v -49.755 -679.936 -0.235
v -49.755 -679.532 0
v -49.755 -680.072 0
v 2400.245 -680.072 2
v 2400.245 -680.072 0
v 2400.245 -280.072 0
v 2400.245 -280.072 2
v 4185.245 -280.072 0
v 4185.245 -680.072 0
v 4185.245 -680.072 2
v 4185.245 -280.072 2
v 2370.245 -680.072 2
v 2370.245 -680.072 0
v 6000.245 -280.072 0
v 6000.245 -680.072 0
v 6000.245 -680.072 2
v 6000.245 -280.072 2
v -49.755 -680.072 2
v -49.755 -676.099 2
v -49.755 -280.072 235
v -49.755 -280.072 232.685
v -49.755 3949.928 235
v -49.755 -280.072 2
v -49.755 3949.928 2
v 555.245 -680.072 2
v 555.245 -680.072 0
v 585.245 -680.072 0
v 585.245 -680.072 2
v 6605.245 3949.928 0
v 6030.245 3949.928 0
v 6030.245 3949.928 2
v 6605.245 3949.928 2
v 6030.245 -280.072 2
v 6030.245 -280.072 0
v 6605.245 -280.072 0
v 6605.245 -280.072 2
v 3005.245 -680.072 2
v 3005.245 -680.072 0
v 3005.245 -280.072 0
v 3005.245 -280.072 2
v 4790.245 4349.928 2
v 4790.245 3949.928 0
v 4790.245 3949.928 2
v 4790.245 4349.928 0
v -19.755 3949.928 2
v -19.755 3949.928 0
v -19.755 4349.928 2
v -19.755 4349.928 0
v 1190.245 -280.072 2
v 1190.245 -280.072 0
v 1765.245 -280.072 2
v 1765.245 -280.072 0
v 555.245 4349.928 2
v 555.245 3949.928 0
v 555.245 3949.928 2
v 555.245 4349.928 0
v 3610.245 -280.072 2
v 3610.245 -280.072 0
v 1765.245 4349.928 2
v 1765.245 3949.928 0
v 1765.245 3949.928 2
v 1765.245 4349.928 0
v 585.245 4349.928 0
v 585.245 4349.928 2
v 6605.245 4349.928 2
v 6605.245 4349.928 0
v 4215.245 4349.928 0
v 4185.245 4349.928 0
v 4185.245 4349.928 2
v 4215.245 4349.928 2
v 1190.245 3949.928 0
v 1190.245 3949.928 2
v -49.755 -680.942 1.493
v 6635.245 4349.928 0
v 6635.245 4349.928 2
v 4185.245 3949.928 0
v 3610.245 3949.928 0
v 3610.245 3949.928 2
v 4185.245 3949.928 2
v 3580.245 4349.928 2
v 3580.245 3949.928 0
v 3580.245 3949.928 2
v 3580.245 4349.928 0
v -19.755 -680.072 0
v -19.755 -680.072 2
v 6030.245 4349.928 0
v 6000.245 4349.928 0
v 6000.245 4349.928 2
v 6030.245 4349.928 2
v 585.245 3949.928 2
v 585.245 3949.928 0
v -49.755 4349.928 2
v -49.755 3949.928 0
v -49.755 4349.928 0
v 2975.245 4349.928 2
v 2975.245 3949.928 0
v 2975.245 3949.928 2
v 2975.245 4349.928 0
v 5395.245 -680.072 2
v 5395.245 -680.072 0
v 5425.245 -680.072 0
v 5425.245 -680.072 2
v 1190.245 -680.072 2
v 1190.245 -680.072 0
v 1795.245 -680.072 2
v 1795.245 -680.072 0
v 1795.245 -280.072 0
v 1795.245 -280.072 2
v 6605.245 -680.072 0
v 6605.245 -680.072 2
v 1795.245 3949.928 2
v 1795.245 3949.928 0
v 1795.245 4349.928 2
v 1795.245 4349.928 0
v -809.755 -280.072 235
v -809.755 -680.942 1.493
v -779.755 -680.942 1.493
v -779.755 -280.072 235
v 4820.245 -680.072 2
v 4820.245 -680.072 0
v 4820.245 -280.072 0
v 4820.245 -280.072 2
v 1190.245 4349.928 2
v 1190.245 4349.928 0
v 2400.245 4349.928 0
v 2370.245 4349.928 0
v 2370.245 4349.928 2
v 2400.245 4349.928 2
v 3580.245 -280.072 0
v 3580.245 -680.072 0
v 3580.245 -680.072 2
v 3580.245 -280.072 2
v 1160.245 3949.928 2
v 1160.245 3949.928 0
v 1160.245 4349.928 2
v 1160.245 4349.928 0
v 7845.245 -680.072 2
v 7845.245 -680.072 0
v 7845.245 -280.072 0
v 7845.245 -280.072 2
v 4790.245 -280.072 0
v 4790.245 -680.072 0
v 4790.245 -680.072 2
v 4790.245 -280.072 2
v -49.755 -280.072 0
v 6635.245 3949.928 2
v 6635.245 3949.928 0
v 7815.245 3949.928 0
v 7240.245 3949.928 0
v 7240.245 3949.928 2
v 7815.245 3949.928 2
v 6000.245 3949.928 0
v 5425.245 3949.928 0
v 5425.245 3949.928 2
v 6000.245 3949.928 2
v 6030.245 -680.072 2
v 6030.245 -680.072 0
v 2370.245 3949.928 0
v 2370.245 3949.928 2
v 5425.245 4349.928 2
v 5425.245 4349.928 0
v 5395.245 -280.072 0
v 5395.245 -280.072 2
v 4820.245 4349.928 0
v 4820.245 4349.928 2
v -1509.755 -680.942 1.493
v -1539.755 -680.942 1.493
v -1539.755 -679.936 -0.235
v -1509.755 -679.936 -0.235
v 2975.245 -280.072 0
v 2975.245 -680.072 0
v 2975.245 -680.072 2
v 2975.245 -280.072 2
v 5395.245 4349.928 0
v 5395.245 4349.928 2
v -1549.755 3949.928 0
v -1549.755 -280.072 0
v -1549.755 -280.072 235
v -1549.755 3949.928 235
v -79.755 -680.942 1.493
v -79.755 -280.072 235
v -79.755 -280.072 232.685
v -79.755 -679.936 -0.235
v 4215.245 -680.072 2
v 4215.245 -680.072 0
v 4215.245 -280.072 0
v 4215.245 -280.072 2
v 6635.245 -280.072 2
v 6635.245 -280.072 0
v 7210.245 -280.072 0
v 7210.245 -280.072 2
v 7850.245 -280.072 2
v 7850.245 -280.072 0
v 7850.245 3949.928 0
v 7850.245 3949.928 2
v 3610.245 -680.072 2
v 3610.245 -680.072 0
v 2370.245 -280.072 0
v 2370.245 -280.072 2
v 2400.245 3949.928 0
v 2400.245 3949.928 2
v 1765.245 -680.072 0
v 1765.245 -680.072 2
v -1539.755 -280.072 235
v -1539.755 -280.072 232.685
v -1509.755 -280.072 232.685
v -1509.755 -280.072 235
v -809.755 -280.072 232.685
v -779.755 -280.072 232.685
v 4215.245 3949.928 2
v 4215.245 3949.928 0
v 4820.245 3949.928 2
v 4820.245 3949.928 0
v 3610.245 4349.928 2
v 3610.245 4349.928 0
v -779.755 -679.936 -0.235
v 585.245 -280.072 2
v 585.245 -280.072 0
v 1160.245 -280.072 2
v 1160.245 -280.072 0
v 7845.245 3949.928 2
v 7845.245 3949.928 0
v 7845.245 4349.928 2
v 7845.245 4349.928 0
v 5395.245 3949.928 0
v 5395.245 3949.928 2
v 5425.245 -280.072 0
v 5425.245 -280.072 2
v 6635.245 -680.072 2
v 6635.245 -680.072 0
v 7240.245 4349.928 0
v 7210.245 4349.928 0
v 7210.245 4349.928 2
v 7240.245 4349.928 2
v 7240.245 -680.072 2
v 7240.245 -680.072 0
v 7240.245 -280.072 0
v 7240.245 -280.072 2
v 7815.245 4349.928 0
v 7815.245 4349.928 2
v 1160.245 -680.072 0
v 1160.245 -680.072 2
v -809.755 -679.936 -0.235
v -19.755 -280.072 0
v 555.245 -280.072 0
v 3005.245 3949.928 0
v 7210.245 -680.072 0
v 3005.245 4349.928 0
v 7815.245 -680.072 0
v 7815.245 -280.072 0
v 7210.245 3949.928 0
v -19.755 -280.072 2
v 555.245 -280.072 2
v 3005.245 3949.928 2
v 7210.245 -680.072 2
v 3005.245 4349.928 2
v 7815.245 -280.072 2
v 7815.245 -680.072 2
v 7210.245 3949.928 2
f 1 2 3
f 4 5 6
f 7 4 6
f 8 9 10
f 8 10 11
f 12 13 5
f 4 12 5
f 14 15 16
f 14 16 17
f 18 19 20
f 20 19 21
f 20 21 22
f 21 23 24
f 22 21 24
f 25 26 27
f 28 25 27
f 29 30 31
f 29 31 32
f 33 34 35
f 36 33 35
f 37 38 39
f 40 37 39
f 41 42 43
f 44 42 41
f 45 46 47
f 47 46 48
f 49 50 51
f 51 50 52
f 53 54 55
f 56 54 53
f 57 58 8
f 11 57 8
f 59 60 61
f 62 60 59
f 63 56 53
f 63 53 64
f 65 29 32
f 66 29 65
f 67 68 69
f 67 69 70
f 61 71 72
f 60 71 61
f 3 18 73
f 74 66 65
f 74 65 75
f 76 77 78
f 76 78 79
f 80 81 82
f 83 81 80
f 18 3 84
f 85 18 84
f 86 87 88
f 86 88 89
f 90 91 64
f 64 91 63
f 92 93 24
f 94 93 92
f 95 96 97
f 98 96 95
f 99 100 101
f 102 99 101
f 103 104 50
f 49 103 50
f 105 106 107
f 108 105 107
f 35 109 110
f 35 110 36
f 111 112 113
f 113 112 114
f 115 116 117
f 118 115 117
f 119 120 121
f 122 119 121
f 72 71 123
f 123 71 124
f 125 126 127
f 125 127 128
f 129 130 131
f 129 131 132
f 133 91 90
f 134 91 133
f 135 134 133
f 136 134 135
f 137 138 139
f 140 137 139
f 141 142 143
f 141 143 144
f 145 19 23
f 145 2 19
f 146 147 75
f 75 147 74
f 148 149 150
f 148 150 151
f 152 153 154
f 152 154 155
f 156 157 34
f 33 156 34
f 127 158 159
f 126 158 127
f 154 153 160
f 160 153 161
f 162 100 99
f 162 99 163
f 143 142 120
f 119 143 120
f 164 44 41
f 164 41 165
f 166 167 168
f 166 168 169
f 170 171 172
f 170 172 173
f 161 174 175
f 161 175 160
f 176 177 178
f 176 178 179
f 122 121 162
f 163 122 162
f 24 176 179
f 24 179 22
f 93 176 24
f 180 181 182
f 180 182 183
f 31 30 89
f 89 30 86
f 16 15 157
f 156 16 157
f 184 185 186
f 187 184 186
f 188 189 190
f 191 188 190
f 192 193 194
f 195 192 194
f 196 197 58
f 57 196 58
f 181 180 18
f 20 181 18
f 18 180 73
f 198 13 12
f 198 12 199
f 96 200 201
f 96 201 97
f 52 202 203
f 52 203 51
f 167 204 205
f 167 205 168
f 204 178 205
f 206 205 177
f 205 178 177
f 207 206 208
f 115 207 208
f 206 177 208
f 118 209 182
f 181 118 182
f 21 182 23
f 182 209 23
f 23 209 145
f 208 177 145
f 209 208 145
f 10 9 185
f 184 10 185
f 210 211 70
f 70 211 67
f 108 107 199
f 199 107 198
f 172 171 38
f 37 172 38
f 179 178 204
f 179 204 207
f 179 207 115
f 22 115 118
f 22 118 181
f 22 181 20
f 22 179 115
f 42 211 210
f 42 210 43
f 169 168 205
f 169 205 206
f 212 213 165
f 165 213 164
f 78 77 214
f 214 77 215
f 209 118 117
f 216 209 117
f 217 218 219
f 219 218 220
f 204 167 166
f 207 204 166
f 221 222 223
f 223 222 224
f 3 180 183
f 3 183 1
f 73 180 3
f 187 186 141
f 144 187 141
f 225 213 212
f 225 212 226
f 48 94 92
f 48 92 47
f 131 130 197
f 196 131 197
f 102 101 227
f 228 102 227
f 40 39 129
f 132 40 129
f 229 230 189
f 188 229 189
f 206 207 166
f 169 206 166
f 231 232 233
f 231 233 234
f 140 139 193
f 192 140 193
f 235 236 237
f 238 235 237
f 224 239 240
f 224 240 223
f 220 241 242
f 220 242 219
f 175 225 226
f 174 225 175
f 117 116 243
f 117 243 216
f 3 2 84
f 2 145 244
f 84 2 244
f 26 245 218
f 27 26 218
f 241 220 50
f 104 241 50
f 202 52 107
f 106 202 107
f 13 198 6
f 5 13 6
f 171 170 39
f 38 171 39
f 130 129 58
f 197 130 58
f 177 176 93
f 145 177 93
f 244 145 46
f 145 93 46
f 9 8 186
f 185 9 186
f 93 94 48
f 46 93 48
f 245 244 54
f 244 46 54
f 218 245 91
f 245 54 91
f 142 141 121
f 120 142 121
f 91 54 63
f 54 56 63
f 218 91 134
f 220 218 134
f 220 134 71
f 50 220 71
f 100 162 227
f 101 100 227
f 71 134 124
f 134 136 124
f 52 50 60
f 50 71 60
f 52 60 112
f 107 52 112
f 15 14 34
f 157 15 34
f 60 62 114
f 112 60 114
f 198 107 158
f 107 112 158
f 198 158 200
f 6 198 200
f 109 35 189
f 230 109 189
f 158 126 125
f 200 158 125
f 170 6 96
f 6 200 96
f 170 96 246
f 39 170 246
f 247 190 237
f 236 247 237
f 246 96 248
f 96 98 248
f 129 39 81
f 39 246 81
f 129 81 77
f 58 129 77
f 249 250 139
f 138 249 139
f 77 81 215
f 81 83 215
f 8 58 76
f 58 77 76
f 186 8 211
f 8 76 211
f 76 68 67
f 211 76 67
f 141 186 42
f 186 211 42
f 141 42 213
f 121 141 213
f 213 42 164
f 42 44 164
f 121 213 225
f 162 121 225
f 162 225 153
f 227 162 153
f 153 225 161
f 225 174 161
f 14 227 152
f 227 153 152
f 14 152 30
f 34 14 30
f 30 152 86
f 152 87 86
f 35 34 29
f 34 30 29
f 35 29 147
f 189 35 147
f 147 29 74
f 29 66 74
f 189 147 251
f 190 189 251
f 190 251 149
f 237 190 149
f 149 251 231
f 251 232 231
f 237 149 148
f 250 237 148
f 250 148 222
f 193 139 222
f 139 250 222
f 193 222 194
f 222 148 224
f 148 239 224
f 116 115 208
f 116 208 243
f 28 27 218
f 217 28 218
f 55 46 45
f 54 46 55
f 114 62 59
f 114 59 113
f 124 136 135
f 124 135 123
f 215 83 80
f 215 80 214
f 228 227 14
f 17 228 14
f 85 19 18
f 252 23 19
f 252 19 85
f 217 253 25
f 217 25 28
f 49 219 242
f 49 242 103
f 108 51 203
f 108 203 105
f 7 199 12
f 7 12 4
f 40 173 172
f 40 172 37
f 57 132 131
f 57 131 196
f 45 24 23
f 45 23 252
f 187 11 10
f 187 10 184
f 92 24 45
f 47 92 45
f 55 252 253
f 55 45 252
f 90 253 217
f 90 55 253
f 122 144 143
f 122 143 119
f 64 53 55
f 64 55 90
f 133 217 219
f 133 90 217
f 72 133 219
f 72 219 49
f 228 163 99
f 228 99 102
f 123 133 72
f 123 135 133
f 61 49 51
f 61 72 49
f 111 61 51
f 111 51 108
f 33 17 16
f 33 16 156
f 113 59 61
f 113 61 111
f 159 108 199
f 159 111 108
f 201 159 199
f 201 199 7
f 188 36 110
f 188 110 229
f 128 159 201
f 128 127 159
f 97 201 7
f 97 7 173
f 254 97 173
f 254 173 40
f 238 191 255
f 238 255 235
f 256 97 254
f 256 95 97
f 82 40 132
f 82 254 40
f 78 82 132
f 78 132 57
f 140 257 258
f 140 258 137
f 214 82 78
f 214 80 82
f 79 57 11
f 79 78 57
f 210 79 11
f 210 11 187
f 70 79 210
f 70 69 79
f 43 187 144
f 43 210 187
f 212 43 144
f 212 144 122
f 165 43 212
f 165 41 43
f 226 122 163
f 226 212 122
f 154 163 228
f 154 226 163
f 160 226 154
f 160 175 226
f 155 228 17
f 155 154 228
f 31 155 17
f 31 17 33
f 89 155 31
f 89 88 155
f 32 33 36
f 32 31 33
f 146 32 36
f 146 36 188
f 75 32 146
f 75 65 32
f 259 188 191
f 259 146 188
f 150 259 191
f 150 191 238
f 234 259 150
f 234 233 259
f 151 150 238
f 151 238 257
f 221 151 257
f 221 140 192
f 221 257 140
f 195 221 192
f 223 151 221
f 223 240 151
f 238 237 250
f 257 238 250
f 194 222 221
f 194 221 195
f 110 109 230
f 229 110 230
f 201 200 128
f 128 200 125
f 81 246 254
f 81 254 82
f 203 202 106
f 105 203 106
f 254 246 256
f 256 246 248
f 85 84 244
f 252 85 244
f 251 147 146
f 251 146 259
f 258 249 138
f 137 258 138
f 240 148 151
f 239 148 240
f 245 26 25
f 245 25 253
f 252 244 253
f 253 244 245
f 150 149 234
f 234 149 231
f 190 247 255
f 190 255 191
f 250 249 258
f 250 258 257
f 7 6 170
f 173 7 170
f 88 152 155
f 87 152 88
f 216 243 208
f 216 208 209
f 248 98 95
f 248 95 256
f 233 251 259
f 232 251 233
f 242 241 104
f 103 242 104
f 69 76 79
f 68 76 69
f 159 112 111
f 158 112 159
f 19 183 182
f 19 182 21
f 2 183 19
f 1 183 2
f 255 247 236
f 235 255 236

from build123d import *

# Parameters (mm, degrees)
F0_W     = 1500
F0_H     = 4230
F1_DEPTH = 235
F2_W     = 7900
F2_H     = 4230
F3_DEPTH = 2
F4_W     = 30
F4_H     = 400
F5_DEPTH = 2
F7_W     = 30
F7_H     = 463.9202661871
F8_DEPTH = 2


with BuildPart() as f1:
    # F0 (on Top) → F1 (new body)
    with BuildSketch(Plane.XY):
        with Locations((-799.7552353144, 1834.9275854864)):
            Rectangle(F0_W, F0_H)
    extrude(amount=F1_DEPTH)

    # F2 (on Top) → F3 (join)
    with BuildSketch(Plane.XY):
        with Locations((3900.2447646856, 1834.9275854864)):
            Rectangle(F2_W, F2_H)
    extrude(amount=F3_DEPTH)

    # F4 (on Top) → F5 (join)
    with BuildSketch(Plane.XY):
        with Locations((-34.7552353144, 4149.9275854864)):
            Rectangle(F4_W, F4_H)
        with Locations((570.2447646856, 4149.9275854864)):
            Rectangle(F4_W, F4_H)
        with Locations((1175.2447646856, 4149.9275854864)):
            Rectangle(F4_W, F4_H)
        with Locations((1780.2447646856, 4149.9275854864)):
            Rectangle(F4_W, F4_H)
        with Locations((2385.2447646856, 4149.9275854864)):
            Rectangle(F4_W, F4_H)
        with Locations((2990.2447646856, 4149.9275854864)):
            Rectangle(F4_W, F4_H)
        with Locations((3595.2447646856, 4149.9275854864)):
            Rectangle(F4_W, F4_H)
        with Locations((4200.2447646856, 4149.9275854864)):
            Rectangle(F4_W, F4_H)
        with Locations((4805.2447646856, 4149.9275854864)):
            Rectangle(F4_W, F4_H)
        with Locations((5410.2447646856, 4149.9275854864)):
            Rectangle(F4_W, F4_H)
        with Locations((6015.2447646856, 4149.9275854864)):
            Rectangle(F4_W, F4_H)
        with Locations((6620.2447646856, 4149.9275854864)):
            Rectangle(F4_W, F4_H)
        with Locations((7225.2447646856, 4149.9275854864)):
            Rectangle(F4_W, F4_H)
        with Locations((7830.2447646856, 4149.9275854864)):
            Rectangle(F4_W, F4_H)
        with Locations((-34.7552353144, -480.0724145136)):
            Rectangle(F4_W, F4_H)
        with Locations((570.2447646856, -480.0724145136)):
            Rectangle(F4_W, F4_H)
        with Locations((1780.2447646856, -480.0724145136)):
            Rectangle(F4_W, F4_H)
        with Locations((7225.2447646856, -480.0724145136)):
            Rectangle(F4_W, F4_H)
        with Locations((4805.2447646856, -480.0724145136)):
            Rectangle(F4_W, F4_H)
        with Locations((3595.2447646856, -480.0724145136)):
            Rectangle(F4_W, F4_H)
        with Locations((2385.2447646856, -480.0724145136)):
            Rectangle(F4_W, F4_H)
        with Locations((5410.2447646856, -480.0724145136)):
            Rectangle(F4_W, F4_H)
        with Locations((7830.2447646856, -480.0724145136)):
            Rectangle(F4_W, F4_H)
        with Locations((6620.2447646856, -480.0724145136)):
            Rectangle(F4_W, F4_H)
        with Locations((6015.2447646856, -480.0724145136)):
            Rectangle(F4_W, F4_H)
        with Locations((2990.2447646856, -480.0724145136)):
            Rectangle(F4_W, F4_H)
        with Locations((4200.2447646856, -480.0724145136)):
            Rectangle(F4_W, F4_H)
        with Locations((1175.2447646856, -480.0724145136)):
            Rectangle(F4_W, F4_H)
    extrude(amount=F5_DEPTH)

    # F7 (on 3pt) → F8 (join)
    with BuildSketch(Plane(origin=(0, -173.1626509598, 297.2749372701), x_dir=(1, 0, 0), z_dir=(0, 0.5033336687, -0.8640921351))):
        with Locations((-64.7552353144, 355.6850915907)):
            Rectangle(F7_W, F7_H)
        with Locations((-794.7552353144, 355.6850915907)):
            Rectangle(F7_W, F7_H)
        with Locations((-1524.7552353144, 355.6850915907)):
            Rectangle(F7_W, F7_H)
    extrude(amount=F8_DEPTH)


solid = f1.part
